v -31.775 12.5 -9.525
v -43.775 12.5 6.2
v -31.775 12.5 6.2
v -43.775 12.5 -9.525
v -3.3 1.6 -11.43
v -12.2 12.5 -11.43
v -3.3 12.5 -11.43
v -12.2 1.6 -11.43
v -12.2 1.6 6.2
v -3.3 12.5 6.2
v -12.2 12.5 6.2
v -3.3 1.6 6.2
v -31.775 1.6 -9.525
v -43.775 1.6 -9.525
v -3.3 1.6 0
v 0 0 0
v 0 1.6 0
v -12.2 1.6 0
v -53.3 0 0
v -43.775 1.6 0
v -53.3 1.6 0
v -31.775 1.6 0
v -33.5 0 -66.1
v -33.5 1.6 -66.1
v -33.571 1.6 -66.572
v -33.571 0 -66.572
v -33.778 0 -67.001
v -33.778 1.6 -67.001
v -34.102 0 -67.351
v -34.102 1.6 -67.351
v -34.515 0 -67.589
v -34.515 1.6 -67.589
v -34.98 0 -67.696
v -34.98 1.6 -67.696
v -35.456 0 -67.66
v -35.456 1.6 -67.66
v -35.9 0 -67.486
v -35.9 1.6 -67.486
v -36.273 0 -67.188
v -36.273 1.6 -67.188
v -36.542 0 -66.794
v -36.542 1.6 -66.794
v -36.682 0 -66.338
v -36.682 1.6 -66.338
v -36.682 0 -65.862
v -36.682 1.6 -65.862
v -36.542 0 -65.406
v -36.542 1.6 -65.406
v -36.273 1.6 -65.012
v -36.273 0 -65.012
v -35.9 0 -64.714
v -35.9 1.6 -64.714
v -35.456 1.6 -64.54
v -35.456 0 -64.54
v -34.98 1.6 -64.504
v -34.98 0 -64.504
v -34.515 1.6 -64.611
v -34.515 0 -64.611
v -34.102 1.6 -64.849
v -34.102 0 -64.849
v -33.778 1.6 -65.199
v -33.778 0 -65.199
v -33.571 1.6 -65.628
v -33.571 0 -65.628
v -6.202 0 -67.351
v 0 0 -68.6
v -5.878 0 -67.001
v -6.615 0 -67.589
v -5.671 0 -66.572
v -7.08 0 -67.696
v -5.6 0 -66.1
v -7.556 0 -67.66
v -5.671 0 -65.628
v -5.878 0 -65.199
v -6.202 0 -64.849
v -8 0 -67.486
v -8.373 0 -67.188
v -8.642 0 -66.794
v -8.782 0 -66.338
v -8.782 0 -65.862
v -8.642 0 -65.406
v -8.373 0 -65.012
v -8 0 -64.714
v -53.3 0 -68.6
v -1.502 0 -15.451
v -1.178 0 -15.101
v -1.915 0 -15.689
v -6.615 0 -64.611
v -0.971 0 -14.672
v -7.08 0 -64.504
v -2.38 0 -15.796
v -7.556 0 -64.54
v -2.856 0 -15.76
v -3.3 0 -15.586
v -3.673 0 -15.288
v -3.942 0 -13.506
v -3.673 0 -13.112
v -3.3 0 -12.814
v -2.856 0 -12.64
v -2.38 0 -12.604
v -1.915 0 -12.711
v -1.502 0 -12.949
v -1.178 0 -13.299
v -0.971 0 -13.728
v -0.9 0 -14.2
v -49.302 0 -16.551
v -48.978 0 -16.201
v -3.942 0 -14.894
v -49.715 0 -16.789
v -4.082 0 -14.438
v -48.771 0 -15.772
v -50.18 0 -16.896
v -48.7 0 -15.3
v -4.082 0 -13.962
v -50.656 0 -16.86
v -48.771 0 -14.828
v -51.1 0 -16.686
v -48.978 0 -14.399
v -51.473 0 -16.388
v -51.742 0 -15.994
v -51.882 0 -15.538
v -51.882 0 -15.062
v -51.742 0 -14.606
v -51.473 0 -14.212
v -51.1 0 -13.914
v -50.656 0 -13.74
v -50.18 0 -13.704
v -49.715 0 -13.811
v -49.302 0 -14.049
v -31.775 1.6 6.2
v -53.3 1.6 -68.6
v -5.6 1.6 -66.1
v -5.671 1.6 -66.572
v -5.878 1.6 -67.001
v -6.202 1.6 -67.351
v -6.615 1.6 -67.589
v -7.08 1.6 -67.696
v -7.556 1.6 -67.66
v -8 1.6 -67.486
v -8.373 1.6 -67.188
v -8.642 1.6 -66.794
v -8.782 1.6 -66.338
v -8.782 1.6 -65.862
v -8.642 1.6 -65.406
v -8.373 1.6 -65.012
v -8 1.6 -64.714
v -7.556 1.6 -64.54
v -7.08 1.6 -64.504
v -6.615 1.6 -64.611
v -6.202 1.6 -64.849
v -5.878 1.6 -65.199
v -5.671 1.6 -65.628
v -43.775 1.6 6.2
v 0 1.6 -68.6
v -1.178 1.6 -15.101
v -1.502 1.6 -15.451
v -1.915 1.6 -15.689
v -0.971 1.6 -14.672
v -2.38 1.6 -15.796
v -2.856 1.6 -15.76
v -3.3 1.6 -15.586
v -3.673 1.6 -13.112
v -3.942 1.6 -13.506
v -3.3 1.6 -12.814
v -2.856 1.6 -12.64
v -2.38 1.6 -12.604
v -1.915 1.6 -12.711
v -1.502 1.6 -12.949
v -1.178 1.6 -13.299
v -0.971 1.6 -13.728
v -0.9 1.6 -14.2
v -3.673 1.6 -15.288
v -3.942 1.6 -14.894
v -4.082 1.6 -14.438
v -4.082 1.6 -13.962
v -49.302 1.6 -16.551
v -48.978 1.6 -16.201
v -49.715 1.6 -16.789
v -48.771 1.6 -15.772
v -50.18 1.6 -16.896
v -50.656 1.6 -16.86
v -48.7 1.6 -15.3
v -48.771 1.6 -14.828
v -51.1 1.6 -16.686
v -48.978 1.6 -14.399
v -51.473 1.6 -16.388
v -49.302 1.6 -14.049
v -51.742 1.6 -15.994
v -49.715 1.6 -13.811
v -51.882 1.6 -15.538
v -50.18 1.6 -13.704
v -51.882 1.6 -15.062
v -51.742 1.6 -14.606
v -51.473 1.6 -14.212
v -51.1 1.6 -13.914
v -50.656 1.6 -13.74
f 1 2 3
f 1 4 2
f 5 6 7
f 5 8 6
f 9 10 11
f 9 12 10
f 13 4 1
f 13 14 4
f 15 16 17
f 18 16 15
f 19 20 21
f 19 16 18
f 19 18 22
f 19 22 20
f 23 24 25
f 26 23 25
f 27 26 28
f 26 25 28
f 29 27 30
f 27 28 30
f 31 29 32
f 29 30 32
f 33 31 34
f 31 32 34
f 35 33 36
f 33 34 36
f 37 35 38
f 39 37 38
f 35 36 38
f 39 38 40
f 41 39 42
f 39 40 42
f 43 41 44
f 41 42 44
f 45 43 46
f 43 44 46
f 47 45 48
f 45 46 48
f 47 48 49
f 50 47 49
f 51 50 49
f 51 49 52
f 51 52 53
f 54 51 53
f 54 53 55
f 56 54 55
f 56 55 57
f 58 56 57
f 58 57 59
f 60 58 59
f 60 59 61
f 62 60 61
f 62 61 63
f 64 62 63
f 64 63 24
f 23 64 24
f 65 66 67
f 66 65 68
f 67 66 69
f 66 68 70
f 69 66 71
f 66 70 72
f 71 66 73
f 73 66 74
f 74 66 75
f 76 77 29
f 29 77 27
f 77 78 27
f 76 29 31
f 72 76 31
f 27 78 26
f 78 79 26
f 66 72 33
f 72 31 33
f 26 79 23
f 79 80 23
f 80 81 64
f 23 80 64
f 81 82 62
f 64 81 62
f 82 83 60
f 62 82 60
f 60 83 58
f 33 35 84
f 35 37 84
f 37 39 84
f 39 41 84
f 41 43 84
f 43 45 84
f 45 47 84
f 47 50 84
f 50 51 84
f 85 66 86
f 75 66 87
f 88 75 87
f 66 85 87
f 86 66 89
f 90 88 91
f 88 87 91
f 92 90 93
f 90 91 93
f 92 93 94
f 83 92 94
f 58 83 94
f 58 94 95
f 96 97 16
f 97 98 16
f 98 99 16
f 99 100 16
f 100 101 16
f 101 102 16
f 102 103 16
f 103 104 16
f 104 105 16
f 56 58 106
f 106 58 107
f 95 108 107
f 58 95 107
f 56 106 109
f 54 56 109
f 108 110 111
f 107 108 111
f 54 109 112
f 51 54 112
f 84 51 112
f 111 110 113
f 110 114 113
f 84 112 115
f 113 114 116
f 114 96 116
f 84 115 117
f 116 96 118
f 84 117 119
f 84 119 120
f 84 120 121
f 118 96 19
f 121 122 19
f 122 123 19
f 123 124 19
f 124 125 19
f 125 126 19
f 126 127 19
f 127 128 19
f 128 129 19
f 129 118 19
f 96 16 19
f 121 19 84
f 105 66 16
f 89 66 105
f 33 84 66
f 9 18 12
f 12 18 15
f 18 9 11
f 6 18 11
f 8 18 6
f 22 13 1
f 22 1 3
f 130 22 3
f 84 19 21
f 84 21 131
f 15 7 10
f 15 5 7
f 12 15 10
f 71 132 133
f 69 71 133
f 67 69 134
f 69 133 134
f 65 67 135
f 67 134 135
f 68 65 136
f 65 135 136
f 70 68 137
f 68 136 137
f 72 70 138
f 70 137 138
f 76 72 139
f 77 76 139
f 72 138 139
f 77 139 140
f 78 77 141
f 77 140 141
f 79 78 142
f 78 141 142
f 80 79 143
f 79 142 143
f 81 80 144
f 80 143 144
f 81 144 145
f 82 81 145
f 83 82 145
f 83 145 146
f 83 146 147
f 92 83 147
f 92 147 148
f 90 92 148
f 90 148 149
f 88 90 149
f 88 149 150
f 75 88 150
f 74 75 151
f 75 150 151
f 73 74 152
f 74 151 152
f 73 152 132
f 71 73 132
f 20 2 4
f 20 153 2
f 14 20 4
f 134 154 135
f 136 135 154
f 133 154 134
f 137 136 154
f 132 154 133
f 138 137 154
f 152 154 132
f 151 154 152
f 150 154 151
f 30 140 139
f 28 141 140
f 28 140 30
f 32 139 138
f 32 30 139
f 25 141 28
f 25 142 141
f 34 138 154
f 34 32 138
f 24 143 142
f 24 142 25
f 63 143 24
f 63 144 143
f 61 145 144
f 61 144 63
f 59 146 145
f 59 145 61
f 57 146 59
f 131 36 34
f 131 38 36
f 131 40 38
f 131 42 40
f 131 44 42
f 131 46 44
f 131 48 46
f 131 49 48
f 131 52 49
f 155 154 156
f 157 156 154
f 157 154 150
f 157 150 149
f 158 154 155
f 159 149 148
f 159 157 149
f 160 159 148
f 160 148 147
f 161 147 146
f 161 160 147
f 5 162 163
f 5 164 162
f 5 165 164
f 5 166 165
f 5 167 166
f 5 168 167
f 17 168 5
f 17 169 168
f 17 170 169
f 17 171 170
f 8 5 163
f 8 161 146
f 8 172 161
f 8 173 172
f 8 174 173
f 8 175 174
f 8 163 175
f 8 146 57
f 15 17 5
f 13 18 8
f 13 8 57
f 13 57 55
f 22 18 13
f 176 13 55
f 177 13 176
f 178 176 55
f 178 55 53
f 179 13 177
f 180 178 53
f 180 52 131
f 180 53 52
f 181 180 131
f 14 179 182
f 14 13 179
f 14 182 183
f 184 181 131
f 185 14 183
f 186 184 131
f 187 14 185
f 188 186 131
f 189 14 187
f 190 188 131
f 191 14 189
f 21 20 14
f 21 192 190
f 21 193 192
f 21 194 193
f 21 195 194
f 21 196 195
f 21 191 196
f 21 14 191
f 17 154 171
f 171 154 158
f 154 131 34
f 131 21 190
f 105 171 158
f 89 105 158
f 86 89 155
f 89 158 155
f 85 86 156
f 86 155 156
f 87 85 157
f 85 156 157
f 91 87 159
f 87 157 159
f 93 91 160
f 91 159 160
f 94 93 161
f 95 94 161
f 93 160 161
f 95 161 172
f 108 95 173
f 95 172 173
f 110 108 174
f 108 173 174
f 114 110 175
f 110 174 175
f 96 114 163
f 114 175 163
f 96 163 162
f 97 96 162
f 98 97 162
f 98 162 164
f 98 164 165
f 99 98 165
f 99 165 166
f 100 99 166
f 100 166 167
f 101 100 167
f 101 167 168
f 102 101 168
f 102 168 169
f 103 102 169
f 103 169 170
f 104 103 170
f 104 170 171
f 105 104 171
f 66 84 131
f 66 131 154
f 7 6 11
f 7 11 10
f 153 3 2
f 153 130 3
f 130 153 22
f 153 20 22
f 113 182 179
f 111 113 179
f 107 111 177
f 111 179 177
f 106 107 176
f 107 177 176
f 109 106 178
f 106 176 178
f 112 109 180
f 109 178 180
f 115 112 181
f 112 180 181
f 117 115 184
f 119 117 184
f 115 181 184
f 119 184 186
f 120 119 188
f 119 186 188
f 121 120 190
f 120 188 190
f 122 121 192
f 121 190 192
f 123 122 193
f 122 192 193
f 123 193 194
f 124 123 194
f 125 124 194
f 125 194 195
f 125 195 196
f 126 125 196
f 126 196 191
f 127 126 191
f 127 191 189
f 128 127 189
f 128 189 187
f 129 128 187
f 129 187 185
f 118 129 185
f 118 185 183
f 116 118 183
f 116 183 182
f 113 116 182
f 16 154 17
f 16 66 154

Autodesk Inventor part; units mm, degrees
ref_plane "YZ Plane" through (0, 0, 0) normal (1, 0, 0) x (0, 1, 0)
ref_plane "XZ Plane" through (0, 0, 0) normal (0, 1, 0) x (-1, 0, 0)
ref_plane "XY Plane" through (0, 0, 0) normal (0, 0, 1) x (1, 0, 0)
sketch "Sketch1" plane through (0, 0, 0) normal (0, 1, 0) x (-1, 0, 0)
  line L0 (0, 0) -> (53.3, 0)
  line L1 (53.3, 0) -> (53.3, -68.6)
  line L2 (53.3, -68.6) -> (0, -68.6)
  line L3 (0, -68.6) -> (0, 0)
  dimension "d0" = 68.6
  dimension "d1" = 53.3
extrude "Extrusion1" add sketch "Sketch1" along normal blind 1.6
sketch "Sketch2" plane through (0, 1.6, 0) normal (0, 1, 0) x (1, 0, 0)
  circle A0 centre (-50.3, 15.3) radius 1.6
  circle A1 centre (-2.5, 14.2) radius 1.6
  circle A2 centre (-7.2, 66.1) radius 1.6
  circle A3 centre (-35.1, 66.1) radius 1.6
  line L0 (-53.3, 0) -> (0, 0) projected
  line L1 (0, 0) -> (0, 68.6) projected
  dimension "d5" = 3.2
  dimension "d6" = 51.9
  dimension "d7" = 50.8
  dimension "d8" = 27.9
  dimension "d9" = 15.2
  dimension "d10" = 4.7
  dimension "d11" = 15.3
  dimension "d12" = 2.5
extrude "Extrusion2" cut sketch "Sketch2" against normal through all
sketch "Sketch3" plane through (0, 1.6, 0) normal (0, 1, 0) x (1, 0, 0)
  line L0 (-43.775, 9.525) -> (-31.775, 9.525)
  line L1 (-31.775, 9.525) -> (-31.775, -6.2)
  line L2 (-31.775, -6.2) -> (-43.775, -6.2)
  line L3 (-43.775, -6.2) -> (-43.775, 9.525)
  line L4 (-12.2, 11.43) -> (-3.3, 11.43)
  line L5 (-3.3, 11.43) -> (-3.3, -6.2)
  line L6 (-3.3, -6.2) -> (-12.2, -6.2)
  line L7 (-12.2, -6.2) -> (-12.2, 11.43)
  line L8 (-53.3, 0) -> (0, 0) projected
  line L9 (0, 0) -> (0, 68.6) projected
  line L10 (-53.3, 68.6) -> (-53.3, 0) projected
  dimension "d15" = 12
  dimension "d16" = 6.2
  dimension "d18" = 8.9
  dimension "d19" = 3.3
  dimension "d20" = 9.525
  dimension "d21" = 11.43
  dimension "d22" = 9.525
extrude "Extrusion3" add sketch "Sketch3" along normal blind 10.9
properties part number "Arduino_Model"
